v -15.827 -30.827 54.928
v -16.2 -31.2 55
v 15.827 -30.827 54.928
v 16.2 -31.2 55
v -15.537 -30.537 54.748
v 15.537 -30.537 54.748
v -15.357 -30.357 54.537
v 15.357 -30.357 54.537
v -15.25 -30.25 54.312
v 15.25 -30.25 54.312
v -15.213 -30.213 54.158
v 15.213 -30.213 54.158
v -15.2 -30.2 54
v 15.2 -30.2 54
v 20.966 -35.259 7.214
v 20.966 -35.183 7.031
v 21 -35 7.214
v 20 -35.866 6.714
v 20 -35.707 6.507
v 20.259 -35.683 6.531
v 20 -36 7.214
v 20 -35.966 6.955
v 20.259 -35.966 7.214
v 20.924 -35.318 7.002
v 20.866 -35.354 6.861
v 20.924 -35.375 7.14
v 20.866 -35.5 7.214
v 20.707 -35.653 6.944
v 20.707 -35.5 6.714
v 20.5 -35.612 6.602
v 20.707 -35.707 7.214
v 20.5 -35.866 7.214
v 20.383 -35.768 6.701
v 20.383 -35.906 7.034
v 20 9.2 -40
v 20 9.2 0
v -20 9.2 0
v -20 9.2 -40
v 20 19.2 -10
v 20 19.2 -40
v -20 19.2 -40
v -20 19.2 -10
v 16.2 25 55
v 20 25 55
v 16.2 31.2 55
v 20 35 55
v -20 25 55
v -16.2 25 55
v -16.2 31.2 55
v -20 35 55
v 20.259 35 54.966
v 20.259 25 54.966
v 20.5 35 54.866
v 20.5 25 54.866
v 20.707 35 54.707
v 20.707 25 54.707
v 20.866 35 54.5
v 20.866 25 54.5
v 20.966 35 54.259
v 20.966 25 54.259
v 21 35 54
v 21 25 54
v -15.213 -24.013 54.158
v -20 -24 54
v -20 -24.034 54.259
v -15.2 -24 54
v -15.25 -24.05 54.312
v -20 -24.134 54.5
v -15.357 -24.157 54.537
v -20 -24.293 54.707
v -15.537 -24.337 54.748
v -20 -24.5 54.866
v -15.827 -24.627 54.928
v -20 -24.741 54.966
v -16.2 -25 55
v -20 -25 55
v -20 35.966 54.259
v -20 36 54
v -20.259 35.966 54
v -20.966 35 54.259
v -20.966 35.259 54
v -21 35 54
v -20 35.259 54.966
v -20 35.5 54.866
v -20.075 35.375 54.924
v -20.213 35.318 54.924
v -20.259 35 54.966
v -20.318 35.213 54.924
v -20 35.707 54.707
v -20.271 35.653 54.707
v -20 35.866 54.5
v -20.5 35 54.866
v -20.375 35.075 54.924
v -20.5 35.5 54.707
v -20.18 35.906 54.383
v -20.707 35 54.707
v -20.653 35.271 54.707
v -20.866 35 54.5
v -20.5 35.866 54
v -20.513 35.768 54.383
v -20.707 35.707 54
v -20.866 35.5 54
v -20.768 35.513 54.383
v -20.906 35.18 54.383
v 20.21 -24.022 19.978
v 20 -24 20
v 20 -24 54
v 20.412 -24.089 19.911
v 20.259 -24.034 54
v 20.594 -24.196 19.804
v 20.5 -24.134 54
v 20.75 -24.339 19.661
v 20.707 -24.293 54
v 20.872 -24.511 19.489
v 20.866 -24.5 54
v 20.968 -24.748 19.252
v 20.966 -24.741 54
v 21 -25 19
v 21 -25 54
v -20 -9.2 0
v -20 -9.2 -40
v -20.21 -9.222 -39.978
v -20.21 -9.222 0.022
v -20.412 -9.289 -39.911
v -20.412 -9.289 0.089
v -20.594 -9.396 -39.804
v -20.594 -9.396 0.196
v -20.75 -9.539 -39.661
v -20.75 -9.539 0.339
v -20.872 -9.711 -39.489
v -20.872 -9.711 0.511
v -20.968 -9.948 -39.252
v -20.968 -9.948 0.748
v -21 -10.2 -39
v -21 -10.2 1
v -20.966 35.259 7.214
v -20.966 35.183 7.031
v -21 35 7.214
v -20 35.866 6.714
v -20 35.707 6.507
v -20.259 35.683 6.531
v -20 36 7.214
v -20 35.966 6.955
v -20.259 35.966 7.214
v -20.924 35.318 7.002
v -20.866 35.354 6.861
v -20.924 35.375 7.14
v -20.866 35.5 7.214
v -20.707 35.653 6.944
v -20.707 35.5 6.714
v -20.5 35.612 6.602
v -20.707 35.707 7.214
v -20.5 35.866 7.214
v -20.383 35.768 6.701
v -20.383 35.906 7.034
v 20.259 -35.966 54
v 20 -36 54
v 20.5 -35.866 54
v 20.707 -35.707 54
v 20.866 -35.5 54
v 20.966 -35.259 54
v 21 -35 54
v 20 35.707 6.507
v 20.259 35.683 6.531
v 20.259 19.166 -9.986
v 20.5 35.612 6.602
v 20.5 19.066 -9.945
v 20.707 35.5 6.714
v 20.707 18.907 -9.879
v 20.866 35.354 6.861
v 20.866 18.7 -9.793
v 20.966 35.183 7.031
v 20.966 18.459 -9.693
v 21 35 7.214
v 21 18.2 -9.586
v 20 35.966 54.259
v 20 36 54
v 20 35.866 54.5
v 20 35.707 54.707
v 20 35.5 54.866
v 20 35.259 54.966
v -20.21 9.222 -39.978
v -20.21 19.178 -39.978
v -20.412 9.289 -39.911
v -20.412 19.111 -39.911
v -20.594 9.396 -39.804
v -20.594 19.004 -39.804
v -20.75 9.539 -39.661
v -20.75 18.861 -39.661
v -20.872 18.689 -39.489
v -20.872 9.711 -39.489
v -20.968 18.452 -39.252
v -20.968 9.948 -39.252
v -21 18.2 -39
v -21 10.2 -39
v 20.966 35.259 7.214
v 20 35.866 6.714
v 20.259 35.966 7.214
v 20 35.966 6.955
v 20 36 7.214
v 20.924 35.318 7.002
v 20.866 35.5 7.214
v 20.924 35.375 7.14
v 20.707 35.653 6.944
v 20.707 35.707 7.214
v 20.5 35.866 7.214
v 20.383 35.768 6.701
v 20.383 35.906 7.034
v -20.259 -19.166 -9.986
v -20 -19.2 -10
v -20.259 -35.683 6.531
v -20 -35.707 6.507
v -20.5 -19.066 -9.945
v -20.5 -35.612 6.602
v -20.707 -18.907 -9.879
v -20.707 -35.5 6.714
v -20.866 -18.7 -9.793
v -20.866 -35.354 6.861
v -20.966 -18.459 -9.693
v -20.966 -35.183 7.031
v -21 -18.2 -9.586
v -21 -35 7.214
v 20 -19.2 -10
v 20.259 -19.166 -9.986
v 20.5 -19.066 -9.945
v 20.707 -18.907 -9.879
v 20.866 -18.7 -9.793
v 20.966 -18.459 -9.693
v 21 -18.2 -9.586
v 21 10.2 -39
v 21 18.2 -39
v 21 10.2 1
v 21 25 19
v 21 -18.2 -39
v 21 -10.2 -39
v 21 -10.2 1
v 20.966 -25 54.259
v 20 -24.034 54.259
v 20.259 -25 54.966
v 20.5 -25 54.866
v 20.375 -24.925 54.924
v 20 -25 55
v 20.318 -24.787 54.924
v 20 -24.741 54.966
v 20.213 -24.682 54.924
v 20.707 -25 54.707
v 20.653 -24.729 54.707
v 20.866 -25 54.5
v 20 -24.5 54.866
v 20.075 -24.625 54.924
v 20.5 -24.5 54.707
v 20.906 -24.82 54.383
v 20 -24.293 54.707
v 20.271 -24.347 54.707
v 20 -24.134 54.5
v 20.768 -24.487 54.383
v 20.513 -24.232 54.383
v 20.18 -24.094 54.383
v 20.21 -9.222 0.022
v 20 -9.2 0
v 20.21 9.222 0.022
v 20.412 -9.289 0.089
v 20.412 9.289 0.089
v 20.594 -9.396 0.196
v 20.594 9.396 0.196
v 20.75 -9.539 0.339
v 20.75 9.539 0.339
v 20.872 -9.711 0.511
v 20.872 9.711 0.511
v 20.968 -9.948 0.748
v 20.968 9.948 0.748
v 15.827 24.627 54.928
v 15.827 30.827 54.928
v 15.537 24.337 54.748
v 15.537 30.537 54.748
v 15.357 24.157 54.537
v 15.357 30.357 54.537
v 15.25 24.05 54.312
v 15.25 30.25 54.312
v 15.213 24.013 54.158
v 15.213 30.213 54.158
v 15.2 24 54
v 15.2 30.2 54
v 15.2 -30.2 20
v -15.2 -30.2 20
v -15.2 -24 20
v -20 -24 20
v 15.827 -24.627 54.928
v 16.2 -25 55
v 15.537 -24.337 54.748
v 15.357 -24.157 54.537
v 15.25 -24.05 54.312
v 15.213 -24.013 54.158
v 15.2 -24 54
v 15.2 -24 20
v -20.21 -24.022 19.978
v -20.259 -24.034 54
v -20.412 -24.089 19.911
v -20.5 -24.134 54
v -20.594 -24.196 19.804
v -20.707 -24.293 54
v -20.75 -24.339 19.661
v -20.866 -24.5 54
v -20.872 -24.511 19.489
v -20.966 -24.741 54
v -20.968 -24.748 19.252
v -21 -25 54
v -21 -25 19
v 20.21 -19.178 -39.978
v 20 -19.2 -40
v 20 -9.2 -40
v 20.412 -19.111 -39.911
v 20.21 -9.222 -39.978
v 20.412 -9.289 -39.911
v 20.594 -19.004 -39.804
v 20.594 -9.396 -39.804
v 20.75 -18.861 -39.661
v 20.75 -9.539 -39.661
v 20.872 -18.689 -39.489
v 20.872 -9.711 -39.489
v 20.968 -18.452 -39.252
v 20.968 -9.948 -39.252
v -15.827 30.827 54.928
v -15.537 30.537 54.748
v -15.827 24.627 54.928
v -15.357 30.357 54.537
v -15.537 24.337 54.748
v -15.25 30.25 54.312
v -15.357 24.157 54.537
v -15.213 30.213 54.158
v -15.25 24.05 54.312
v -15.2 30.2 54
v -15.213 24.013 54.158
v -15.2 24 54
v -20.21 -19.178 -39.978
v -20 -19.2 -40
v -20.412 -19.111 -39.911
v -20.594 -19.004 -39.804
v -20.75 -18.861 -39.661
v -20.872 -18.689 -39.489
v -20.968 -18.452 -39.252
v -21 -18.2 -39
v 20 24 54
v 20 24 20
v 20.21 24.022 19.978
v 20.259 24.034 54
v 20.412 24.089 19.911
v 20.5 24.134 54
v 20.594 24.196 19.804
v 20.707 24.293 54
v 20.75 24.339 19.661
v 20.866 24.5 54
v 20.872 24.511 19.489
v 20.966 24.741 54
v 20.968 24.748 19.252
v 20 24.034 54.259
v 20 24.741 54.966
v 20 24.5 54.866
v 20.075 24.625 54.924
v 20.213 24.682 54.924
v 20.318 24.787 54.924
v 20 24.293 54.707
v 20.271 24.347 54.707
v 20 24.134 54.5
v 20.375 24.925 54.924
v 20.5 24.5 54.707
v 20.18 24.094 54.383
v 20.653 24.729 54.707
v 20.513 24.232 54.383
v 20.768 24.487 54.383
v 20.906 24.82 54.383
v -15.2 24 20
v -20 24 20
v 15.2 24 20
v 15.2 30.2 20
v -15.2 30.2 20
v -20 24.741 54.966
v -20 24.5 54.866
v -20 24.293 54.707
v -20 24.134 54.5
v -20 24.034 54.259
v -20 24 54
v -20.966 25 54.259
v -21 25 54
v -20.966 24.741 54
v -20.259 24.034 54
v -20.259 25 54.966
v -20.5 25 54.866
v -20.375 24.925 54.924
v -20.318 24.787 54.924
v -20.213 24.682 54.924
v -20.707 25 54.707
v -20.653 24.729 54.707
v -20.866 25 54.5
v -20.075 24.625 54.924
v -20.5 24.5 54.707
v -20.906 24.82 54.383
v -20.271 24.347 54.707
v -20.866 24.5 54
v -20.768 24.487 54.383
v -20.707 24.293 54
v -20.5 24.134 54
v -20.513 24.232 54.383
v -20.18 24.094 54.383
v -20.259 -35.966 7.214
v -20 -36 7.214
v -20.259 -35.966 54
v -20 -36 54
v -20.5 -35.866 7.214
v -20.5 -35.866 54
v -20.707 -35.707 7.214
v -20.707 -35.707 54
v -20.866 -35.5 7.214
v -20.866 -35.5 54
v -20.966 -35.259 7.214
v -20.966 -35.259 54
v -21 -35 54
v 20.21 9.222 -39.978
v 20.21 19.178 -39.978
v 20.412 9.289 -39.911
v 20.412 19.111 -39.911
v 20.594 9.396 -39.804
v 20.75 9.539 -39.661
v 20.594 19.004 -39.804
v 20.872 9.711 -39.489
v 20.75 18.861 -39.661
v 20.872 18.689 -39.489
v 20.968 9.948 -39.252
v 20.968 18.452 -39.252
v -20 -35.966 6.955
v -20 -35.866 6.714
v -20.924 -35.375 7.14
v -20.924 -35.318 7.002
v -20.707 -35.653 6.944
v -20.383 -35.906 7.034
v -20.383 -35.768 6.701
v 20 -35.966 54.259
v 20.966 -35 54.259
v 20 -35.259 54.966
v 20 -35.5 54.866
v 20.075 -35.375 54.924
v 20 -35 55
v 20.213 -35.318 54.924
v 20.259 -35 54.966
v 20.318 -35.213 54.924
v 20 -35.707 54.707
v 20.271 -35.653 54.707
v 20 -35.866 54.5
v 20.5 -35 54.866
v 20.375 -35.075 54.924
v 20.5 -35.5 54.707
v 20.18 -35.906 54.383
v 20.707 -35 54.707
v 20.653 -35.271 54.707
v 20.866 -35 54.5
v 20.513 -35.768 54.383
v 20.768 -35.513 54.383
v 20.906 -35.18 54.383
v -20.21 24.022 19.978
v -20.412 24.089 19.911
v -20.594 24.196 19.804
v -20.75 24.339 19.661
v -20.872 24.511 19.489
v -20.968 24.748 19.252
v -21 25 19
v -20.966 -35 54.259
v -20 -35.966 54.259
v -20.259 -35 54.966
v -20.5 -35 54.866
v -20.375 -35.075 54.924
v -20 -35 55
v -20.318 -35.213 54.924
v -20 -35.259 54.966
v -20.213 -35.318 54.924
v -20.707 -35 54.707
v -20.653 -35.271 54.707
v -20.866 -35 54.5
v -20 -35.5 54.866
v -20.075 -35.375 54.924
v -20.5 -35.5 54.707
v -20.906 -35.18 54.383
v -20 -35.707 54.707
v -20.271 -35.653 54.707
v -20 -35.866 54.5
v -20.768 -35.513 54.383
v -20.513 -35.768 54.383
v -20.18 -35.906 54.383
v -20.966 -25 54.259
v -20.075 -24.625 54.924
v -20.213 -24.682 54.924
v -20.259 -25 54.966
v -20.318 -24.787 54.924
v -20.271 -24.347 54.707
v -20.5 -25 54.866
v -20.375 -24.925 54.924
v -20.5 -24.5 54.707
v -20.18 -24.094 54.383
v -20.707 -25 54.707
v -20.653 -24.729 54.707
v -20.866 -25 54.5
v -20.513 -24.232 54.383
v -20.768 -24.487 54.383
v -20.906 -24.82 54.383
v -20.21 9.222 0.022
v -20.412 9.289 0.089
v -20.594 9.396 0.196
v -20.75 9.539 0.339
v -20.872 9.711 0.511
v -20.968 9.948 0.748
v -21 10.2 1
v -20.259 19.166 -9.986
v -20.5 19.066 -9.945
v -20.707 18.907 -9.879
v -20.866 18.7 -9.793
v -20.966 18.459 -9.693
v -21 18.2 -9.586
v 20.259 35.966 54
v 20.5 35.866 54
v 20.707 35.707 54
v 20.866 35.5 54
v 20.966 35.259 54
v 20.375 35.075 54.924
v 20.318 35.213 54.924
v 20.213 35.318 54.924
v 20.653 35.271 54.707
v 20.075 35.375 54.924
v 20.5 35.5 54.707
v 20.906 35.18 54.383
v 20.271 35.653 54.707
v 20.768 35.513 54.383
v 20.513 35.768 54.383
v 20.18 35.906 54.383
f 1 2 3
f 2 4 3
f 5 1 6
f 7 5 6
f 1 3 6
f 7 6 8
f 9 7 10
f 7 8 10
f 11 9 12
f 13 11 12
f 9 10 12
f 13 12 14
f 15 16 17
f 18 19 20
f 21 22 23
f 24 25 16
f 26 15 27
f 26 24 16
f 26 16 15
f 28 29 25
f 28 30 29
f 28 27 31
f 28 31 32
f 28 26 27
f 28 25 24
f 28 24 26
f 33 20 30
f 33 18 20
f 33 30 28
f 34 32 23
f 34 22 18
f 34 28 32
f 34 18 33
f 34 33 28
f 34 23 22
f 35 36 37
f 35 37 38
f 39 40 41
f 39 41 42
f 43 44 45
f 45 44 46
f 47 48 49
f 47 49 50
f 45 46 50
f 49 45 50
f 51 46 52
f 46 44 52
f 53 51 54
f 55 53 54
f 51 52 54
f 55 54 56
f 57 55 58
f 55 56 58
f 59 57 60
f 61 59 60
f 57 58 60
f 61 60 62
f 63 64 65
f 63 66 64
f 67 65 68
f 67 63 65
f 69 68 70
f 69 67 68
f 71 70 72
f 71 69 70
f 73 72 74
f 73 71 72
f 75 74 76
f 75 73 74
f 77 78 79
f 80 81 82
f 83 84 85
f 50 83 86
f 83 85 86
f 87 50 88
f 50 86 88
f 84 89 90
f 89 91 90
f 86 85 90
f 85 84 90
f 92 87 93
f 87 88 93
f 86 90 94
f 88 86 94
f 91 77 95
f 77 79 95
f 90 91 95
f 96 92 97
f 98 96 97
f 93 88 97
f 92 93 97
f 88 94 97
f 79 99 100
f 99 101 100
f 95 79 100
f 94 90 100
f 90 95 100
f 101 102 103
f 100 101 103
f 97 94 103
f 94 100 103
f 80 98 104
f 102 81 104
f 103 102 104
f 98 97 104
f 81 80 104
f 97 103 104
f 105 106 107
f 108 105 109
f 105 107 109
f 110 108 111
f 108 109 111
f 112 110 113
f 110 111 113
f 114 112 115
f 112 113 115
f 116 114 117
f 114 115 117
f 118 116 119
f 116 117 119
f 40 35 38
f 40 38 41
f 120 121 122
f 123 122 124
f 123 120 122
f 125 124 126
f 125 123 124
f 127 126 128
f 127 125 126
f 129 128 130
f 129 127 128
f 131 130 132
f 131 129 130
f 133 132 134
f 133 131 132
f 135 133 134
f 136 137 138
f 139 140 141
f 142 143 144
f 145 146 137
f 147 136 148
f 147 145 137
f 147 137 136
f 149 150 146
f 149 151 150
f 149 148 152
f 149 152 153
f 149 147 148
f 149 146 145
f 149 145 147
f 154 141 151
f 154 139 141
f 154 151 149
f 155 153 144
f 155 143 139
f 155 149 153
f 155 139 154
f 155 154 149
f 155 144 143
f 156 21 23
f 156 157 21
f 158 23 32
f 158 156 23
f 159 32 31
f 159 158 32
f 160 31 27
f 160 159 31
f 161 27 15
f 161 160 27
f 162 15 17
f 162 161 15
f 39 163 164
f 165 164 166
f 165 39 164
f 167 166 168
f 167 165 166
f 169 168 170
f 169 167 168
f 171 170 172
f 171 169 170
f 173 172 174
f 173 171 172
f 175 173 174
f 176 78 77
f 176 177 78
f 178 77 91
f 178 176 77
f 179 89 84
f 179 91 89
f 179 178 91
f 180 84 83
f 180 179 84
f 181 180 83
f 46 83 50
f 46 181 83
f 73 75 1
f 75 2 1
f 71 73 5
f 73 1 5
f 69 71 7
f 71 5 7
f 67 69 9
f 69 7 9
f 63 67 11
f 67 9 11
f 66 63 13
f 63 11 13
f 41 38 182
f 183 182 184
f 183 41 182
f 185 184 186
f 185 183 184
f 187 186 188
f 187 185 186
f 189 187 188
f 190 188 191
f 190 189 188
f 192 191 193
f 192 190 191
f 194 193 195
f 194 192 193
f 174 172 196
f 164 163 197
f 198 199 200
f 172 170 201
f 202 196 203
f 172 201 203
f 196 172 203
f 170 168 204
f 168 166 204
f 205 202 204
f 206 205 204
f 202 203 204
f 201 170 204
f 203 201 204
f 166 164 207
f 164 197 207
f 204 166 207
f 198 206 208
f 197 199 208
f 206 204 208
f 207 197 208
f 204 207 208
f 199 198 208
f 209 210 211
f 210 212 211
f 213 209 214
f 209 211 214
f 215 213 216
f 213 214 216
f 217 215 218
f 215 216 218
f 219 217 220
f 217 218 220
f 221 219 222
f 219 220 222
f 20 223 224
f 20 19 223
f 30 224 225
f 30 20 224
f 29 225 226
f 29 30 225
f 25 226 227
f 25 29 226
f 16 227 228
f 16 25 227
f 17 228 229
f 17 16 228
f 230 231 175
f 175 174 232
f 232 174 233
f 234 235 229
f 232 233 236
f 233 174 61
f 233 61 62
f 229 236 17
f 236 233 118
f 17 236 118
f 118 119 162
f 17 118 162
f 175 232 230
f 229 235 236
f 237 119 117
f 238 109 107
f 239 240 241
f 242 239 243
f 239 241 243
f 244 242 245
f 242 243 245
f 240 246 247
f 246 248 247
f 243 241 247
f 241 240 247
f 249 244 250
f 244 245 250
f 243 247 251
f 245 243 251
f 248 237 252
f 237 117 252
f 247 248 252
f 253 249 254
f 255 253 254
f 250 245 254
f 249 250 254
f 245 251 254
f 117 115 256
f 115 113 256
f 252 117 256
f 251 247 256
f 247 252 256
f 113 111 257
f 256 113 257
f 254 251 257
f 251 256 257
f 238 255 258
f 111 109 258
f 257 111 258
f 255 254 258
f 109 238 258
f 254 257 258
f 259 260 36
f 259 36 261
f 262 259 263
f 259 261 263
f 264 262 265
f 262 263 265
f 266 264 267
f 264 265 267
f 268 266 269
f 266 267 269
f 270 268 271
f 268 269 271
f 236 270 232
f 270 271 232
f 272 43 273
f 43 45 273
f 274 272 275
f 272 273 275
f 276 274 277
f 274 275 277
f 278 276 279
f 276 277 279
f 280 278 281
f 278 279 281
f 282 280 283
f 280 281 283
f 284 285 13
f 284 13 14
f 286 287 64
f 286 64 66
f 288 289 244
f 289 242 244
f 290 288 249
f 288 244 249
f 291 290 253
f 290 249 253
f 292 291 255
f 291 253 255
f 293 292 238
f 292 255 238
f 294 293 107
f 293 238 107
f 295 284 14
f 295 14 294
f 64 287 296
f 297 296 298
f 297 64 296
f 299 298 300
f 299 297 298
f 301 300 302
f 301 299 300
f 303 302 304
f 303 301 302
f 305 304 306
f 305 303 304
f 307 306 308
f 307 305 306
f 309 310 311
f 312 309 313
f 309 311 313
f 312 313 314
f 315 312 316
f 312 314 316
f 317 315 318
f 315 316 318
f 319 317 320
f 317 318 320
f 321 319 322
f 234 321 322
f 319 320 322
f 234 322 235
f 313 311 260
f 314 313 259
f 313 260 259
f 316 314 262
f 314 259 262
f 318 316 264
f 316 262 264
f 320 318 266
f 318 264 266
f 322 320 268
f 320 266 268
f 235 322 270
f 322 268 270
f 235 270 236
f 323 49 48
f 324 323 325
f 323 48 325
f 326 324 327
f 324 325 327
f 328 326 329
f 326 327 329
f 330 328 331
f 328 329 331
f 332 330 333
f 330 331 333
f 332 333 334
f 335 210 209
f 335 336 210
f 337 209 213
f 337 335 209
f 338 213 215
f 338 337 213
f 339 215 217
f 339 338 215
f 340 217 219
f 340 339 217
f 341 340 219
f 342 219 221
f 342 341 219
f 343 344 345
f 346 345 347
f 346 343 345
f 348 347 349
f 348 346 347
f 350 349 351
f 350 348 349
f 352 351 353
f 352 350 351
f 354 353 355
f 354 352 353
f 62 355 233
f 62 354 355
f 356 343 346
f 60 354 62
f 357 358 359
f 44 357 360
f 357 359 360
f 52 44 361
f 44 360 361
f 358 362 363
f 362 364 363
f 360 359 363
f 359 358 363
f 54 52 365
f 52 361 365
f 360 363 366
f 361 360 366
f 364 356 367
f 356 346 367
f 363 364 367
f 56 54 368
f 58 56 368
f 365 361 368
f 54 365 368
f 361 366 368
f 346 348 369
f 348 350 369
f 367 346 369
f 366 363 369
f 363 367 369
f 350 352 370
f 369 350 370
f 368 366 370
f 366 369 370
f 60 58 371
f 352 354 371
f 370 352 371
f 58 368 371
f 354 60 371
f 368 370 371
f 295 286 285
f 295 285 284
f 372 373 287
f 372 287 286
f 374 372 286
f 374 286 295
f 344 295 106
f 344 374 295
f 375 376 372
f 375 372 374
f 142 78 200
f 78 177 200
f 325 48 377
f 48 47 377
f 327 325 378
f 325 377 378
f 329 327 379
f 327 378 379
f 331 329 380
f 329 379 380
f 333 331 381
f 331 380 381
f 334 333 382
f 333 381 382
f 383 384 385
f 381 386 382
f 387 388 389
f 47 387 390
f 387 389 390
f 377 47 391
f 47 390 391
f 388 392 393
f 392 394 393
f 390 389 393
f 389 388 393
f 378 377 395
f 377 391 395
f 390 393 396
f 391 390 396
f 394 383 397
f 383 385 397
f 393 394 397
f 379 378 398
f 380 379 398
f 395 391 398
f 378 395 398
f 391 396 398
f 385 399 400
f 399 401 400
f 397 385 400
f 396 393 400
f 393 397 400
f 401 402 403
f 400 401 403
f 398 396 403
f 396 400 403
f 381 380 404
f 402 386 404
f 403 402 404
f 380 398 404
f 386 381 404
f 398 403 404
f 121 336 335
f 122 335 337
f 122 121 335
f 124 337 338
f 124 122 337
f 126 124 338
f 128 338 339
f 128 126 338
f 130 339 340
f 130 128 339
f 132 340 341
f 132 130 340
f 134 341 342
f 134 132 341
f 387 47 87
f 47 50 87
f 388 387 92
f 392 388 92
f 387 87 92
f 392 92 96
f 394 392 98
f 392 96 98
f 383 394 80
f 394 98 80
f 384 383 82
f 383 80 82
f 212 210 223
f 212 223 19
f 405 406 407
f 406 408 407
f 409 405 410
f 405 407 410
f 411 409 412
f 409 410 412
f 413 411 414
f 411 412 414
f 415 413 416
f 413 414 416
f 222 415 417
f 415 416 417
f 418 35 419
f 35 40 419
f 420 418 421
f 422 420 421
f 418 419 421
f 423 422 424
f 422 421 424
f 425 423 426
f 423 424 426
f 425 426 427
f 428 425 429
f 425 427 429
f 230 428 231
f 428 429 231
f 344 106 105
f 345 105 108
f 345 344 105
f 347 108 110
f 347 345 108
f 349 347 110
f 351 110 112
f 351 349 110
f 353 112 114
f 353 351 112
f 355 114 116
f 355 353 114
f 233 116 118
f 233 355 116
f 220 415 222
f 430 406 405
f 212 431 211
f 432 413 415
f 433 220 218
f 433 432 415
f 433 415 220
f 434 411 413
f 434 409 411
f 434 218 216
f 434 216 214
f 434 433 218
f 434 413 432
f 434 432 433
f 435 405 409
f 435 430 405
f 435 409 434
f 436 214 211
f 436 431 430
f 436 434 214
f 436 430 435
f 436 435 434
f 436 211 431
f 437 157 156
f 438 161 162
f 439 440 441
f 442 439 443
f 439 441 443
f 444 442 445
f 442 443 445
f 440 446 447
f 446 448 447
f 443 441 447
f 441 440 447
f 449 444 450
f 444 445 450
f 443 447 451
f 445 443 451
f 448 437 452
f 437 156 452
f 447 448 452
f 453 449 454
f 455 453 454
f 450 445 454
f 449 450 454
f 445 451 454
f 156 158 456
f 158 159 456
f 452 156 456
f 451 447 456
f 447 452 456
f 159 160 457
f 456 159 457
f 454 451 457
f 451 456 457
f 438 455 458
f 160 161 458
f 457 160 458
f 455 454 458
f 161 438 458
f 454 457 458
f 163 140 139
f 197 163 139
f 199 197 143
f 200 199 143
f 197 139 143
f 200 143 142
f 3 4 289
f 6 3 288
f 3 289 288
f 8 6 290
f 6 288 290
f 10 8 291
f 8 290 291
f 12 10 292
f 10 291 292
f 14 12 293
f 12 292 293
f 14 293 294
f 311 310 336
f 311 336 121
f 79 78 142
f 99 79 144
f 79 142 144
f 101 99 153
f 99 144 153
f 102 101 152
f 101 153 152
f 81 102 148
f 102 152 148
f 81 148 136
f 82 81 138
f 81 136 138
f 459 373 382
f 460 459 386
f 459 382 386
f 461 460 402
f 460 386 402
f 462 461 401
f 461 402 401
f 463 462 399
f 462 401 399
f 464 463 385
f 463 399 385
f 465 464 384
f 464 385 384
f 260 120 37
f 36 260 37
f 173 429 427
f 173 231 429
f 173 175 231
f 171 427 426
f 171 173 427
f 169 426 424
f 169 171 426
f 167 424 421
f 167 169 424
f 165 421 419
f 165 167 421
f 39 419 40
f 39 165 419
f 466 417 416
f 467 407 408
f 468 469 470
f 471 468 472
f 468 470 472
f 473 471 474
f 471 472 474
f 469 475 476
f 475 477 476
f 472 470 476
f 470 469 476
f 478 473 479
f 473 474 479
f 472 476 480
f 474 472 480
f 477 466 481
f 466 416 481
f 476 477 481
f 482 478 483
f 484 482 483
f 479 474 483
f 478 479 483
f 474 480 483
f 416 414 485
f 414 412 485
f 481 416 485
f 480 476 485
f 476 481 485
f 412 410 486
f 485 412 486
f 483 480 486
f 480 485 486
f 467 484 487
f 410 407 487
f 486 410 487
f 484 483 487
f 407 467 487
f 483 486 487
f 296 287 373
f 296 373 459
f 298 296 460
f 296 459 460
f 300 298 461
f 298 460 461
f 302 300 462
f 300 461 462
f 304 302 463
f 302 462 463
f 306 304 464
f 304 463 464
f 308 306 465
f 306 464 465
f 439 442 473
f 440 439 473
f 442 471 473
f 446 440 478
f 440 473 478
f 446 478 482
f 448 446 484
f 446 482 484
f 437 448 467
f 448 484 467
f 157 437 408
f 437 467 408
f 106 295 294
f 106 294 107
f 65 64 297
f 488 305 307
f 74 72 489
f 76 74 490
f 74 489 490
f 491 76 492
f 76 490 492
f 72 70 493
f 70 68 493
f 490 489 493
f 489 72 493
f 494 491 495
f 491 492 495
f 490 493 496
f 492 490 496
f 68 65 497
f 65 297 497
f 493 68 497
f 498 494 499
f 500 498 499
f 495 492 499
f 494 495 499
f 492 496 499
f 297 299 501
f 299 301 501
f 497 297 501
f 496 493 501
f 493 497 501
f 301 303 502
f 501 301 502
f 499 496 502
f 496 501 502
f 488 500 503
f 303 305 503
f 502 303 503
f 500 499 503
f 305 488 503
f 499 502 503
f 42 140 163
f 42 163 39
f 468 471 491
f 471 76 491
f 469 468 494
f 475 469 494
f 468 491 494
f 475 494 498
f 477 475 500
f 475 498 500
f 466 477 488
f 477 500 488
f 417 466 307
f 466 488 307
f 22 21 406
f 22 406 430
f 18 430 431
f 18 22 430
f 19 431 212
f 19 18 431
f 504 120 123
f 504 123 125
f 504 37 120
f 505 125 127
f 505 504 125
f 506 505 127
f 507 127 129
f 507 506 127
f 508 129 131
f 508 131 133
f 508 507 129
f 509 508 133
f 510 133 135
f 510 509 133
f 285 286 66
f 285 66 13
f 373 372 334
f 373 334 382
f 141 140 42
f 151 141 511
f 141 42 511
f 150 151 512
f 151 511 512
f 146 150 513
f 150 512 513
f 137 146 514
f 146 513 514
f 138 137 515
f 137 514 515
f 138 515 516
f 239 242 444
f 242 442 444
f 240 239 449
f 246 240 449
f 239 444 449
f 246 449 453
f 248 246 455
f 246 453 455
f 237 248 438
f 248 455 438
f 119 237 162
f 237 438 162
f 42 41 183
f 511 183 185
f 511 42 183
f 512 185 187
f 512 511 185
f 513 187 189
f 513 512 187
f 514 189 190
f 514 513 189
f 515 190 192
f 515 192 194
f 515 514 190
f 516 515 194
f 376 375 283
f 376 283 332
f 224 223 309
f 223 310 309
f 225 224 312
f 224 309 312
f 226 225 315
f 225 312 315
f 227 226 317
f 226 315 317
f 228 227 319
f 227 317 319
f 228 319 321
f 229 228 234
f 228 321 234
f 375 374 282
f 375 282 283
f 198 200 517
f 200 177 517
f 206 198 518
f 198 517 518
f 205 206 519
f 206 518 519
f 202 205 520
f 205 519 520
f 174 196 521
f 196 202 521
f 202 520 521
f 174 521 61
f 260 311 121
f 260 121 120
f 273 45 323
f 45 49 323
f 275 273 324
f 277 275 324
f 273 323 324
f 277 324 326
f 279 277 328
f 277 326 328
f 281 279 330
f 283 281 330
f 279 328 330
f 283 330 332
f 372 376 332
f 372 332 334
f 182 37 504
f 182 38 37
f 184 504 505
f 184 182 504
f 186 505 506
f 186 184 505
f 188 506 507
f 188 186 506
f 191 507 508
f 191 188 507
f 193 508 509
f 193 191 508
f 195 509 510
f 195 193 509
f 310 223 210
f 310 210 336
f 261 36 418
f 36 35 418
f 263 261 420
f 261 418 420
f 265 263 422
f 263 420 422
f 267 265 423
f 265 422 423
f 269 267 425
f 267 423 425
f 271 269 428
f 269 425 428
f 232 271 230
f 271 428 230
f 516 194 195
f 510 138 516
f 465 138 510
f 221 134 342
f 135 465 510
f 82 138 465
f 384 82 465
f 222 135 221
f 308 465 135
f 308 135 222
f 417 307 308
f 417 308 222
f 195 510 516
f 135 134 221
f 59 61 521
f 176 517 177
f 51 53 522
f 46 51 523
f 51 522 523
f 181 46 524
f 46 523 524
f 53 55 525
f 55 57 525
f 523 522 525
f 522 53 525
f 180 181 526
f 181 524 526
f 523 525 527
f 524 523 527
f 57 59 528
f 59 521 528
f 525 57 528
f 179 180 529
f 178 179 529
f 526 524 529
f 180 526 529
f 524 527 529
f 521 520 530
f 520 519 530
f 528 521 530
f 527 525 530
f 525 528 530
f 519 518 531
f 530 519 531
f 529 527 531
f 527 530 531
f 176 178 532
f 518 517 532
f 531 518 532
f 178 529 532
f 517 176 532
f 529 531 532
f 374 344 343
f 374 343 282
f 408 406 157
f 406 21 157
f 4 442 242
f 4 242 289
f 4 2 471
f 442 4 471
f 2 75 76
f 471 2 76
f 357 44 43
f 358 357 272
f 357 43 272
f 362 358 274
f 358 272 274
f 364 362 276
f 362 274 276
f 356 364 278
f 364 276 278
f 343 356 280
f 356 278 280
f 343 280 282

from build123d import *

# Parameters (mm, degrees)
BOSS_EXTRUDE1_DEPTH = 21
SKETCH2_W           = 42
SKETCH2_H           = 72
BOSS_EXTRUDE2_DEPTH = 10
BOSS_EXTRUDE3_DEPTH = 35
CHAMFER1_SIZE       = 20
FILLET1_R           = 1


with BuildPart() as part:
    # Sketch1 → Boss-Extrude1 (new, symmetric)
    with BuildSketch(Plane(origin=(0, 0, 0), x_dir=(0, 0, -1), z_dir=(1, 0, 0))):
        Polygon((0, -9.2), (0, 9.2), (40, 9.2), (40, 19.2), (-10, 19.2), (-10, -19.2), (40, -19.2), (40, -9.2), align=None)
    extrude(amount=BOSS_EXTRUDE1_DEPTH, both=True)

    # Sketch2 → Boss-Extrude2 (add)
    with BuildSketch(Plane.XY.offset(10)):
        Rectangle(SKETCH2_W, SKETCH2_H)
    extrude(amount=BOSS_EXTRUDE2_DEPTH)

    # Sketch3 → Boss-Extrude3 (add)
    with BuildSketch(Plane.XY.offset(20)):
        Polygon((-15.2, 30.2), (-15.2, 24), (-21, 24), (-21, 36), (21, 36), (21, 24), (15.2, 24), (15.2, 30.2), align=None)
        Polygon((-15.2, -30.2), (15.2, -30.2), (15.2, -24), (21, -24), (21, -36), (-21, -36), (-21, -24), (-15.2, -24), align=None)
    extrude(amount=BOSS_EXTRUDE3_DEPTH)

    # Chamfer1
    # the kernel refuses this chamfer: 20 mm, written as the material it adds along each edge
    with BuildSketch(Plane(origin=(-21, -19.2, 10), x_dir=(0, 0.027495876610586317, -0.9996219169112968), z_dir=(1, 0, 0))) as chamfer1_piece_1_section:
        Polygon((CHAMFER1_SIZE * 0.999621916911, -CHAMFER1_SIZE * 0.0274958766106), (-CHAMFER1_SIZE * 0.0274958766106, -CHAMFER1_SIZE * 0.999621916911), (0, 0), align=None)
    chamfer1_piece_1 = extrude(amount=42, mode=Mode.PRIVATE)
    chamfer1_piece_1 = split(chamfer1_piece_1, bisect_by=Plane(origin=(0, -36, 3.17327651), z_dir=(0, 1, 0)), keep=Keep.TOP, mode=Mode.PRIVATE)
    add(chamfer1_piece_1)
    with BuildSketch(Plane(origin=(-21, 19.2, 10), x_dir=(0, 0.9996219169112968, 0.027495876610586403), z_dir=(1, 0, 0))) as chamfer1_piece_2_section:
        Polygon((CHAMFER1_SIZE * 0.999621916911, -CHAMFER1_SIZE * 0.0274958766106), (-CHAMFER1_SIZE * 0.0274958766106, -CHAMFER1_SIZE * 0.999621916911), (0, 0), align=None)
    chamfer1_piece_2 = extrude(amount=42, mode=Mode.PRIVATE)
    chamfer1_piece_2 = split(chamfer1_piece_2, bisect_by=Plane(origin=(0, 36, 3.17327651), z_dir=(0, -1, 0)), keep=Keep.TOP, mode=Mode.PRIVATE)
    add(chamfer1_piece_2)

    # Fillet1
    fillet1_edges = [part.edges().sort_by_distance(p)[0] for p in [
        (-21, 19.2, -25),
        (-21, 14.2, -40),
        (21, -14.2, -40),
        (21, -9.2, -20),
        (-21, 36, 30.9),
        (-21, -36, 30.9),
        (21, -36, 30.9),
        (21, 36, 30.9),
        (21, 0, 0),
        (21, 9.2, -20),
        (-21, 0, 20),
        (21, 24, 37.5),
        (-21, 24, 37.5),
        (0, 30.2, 55),
        (15.2, 27.1, 55),
        (18.1, 24, 55),
        (21, 30, 55),
        (0, 36, 55),
        (-21, 30, 55),
        (-18.1, 24, 55),
        (-15.2, 27.1, 55),
        (21, 14.2, -40),
        (21, 0, 20),
        (-21, -24, 37.5),
        (21, -24, 37.5),
        (-15.2, -27.1, 55),
        (-18.1, -24, 55),
        (-21, -30, 55),
        (0, -36, 55),
        (21, -30, 55),
        (18.1, -24, 55),
        (15.2, -27.1, 55),
        (0, -30.2, 55),
        (-21, -19.2, -25),
        (21, -19.2, -25),
        (-21, -27.6, -1.6),
        (0, -36, 6.8),
        (21, -27.6, -1.6),
        (-21, 9.2, -20),
        (0, 36, 6.8),
        (-21, 27.6, -1.6),
        (21, 27.6, -1.6),
        (21, 19.2, -25),
        (-21, 0, 0),
        (-21, -9.2, -20),
        (-21, -14.2, -40),
    ]]
    fillet(fillet1_edges, radius=FILLET1_R)


solid = part.part
